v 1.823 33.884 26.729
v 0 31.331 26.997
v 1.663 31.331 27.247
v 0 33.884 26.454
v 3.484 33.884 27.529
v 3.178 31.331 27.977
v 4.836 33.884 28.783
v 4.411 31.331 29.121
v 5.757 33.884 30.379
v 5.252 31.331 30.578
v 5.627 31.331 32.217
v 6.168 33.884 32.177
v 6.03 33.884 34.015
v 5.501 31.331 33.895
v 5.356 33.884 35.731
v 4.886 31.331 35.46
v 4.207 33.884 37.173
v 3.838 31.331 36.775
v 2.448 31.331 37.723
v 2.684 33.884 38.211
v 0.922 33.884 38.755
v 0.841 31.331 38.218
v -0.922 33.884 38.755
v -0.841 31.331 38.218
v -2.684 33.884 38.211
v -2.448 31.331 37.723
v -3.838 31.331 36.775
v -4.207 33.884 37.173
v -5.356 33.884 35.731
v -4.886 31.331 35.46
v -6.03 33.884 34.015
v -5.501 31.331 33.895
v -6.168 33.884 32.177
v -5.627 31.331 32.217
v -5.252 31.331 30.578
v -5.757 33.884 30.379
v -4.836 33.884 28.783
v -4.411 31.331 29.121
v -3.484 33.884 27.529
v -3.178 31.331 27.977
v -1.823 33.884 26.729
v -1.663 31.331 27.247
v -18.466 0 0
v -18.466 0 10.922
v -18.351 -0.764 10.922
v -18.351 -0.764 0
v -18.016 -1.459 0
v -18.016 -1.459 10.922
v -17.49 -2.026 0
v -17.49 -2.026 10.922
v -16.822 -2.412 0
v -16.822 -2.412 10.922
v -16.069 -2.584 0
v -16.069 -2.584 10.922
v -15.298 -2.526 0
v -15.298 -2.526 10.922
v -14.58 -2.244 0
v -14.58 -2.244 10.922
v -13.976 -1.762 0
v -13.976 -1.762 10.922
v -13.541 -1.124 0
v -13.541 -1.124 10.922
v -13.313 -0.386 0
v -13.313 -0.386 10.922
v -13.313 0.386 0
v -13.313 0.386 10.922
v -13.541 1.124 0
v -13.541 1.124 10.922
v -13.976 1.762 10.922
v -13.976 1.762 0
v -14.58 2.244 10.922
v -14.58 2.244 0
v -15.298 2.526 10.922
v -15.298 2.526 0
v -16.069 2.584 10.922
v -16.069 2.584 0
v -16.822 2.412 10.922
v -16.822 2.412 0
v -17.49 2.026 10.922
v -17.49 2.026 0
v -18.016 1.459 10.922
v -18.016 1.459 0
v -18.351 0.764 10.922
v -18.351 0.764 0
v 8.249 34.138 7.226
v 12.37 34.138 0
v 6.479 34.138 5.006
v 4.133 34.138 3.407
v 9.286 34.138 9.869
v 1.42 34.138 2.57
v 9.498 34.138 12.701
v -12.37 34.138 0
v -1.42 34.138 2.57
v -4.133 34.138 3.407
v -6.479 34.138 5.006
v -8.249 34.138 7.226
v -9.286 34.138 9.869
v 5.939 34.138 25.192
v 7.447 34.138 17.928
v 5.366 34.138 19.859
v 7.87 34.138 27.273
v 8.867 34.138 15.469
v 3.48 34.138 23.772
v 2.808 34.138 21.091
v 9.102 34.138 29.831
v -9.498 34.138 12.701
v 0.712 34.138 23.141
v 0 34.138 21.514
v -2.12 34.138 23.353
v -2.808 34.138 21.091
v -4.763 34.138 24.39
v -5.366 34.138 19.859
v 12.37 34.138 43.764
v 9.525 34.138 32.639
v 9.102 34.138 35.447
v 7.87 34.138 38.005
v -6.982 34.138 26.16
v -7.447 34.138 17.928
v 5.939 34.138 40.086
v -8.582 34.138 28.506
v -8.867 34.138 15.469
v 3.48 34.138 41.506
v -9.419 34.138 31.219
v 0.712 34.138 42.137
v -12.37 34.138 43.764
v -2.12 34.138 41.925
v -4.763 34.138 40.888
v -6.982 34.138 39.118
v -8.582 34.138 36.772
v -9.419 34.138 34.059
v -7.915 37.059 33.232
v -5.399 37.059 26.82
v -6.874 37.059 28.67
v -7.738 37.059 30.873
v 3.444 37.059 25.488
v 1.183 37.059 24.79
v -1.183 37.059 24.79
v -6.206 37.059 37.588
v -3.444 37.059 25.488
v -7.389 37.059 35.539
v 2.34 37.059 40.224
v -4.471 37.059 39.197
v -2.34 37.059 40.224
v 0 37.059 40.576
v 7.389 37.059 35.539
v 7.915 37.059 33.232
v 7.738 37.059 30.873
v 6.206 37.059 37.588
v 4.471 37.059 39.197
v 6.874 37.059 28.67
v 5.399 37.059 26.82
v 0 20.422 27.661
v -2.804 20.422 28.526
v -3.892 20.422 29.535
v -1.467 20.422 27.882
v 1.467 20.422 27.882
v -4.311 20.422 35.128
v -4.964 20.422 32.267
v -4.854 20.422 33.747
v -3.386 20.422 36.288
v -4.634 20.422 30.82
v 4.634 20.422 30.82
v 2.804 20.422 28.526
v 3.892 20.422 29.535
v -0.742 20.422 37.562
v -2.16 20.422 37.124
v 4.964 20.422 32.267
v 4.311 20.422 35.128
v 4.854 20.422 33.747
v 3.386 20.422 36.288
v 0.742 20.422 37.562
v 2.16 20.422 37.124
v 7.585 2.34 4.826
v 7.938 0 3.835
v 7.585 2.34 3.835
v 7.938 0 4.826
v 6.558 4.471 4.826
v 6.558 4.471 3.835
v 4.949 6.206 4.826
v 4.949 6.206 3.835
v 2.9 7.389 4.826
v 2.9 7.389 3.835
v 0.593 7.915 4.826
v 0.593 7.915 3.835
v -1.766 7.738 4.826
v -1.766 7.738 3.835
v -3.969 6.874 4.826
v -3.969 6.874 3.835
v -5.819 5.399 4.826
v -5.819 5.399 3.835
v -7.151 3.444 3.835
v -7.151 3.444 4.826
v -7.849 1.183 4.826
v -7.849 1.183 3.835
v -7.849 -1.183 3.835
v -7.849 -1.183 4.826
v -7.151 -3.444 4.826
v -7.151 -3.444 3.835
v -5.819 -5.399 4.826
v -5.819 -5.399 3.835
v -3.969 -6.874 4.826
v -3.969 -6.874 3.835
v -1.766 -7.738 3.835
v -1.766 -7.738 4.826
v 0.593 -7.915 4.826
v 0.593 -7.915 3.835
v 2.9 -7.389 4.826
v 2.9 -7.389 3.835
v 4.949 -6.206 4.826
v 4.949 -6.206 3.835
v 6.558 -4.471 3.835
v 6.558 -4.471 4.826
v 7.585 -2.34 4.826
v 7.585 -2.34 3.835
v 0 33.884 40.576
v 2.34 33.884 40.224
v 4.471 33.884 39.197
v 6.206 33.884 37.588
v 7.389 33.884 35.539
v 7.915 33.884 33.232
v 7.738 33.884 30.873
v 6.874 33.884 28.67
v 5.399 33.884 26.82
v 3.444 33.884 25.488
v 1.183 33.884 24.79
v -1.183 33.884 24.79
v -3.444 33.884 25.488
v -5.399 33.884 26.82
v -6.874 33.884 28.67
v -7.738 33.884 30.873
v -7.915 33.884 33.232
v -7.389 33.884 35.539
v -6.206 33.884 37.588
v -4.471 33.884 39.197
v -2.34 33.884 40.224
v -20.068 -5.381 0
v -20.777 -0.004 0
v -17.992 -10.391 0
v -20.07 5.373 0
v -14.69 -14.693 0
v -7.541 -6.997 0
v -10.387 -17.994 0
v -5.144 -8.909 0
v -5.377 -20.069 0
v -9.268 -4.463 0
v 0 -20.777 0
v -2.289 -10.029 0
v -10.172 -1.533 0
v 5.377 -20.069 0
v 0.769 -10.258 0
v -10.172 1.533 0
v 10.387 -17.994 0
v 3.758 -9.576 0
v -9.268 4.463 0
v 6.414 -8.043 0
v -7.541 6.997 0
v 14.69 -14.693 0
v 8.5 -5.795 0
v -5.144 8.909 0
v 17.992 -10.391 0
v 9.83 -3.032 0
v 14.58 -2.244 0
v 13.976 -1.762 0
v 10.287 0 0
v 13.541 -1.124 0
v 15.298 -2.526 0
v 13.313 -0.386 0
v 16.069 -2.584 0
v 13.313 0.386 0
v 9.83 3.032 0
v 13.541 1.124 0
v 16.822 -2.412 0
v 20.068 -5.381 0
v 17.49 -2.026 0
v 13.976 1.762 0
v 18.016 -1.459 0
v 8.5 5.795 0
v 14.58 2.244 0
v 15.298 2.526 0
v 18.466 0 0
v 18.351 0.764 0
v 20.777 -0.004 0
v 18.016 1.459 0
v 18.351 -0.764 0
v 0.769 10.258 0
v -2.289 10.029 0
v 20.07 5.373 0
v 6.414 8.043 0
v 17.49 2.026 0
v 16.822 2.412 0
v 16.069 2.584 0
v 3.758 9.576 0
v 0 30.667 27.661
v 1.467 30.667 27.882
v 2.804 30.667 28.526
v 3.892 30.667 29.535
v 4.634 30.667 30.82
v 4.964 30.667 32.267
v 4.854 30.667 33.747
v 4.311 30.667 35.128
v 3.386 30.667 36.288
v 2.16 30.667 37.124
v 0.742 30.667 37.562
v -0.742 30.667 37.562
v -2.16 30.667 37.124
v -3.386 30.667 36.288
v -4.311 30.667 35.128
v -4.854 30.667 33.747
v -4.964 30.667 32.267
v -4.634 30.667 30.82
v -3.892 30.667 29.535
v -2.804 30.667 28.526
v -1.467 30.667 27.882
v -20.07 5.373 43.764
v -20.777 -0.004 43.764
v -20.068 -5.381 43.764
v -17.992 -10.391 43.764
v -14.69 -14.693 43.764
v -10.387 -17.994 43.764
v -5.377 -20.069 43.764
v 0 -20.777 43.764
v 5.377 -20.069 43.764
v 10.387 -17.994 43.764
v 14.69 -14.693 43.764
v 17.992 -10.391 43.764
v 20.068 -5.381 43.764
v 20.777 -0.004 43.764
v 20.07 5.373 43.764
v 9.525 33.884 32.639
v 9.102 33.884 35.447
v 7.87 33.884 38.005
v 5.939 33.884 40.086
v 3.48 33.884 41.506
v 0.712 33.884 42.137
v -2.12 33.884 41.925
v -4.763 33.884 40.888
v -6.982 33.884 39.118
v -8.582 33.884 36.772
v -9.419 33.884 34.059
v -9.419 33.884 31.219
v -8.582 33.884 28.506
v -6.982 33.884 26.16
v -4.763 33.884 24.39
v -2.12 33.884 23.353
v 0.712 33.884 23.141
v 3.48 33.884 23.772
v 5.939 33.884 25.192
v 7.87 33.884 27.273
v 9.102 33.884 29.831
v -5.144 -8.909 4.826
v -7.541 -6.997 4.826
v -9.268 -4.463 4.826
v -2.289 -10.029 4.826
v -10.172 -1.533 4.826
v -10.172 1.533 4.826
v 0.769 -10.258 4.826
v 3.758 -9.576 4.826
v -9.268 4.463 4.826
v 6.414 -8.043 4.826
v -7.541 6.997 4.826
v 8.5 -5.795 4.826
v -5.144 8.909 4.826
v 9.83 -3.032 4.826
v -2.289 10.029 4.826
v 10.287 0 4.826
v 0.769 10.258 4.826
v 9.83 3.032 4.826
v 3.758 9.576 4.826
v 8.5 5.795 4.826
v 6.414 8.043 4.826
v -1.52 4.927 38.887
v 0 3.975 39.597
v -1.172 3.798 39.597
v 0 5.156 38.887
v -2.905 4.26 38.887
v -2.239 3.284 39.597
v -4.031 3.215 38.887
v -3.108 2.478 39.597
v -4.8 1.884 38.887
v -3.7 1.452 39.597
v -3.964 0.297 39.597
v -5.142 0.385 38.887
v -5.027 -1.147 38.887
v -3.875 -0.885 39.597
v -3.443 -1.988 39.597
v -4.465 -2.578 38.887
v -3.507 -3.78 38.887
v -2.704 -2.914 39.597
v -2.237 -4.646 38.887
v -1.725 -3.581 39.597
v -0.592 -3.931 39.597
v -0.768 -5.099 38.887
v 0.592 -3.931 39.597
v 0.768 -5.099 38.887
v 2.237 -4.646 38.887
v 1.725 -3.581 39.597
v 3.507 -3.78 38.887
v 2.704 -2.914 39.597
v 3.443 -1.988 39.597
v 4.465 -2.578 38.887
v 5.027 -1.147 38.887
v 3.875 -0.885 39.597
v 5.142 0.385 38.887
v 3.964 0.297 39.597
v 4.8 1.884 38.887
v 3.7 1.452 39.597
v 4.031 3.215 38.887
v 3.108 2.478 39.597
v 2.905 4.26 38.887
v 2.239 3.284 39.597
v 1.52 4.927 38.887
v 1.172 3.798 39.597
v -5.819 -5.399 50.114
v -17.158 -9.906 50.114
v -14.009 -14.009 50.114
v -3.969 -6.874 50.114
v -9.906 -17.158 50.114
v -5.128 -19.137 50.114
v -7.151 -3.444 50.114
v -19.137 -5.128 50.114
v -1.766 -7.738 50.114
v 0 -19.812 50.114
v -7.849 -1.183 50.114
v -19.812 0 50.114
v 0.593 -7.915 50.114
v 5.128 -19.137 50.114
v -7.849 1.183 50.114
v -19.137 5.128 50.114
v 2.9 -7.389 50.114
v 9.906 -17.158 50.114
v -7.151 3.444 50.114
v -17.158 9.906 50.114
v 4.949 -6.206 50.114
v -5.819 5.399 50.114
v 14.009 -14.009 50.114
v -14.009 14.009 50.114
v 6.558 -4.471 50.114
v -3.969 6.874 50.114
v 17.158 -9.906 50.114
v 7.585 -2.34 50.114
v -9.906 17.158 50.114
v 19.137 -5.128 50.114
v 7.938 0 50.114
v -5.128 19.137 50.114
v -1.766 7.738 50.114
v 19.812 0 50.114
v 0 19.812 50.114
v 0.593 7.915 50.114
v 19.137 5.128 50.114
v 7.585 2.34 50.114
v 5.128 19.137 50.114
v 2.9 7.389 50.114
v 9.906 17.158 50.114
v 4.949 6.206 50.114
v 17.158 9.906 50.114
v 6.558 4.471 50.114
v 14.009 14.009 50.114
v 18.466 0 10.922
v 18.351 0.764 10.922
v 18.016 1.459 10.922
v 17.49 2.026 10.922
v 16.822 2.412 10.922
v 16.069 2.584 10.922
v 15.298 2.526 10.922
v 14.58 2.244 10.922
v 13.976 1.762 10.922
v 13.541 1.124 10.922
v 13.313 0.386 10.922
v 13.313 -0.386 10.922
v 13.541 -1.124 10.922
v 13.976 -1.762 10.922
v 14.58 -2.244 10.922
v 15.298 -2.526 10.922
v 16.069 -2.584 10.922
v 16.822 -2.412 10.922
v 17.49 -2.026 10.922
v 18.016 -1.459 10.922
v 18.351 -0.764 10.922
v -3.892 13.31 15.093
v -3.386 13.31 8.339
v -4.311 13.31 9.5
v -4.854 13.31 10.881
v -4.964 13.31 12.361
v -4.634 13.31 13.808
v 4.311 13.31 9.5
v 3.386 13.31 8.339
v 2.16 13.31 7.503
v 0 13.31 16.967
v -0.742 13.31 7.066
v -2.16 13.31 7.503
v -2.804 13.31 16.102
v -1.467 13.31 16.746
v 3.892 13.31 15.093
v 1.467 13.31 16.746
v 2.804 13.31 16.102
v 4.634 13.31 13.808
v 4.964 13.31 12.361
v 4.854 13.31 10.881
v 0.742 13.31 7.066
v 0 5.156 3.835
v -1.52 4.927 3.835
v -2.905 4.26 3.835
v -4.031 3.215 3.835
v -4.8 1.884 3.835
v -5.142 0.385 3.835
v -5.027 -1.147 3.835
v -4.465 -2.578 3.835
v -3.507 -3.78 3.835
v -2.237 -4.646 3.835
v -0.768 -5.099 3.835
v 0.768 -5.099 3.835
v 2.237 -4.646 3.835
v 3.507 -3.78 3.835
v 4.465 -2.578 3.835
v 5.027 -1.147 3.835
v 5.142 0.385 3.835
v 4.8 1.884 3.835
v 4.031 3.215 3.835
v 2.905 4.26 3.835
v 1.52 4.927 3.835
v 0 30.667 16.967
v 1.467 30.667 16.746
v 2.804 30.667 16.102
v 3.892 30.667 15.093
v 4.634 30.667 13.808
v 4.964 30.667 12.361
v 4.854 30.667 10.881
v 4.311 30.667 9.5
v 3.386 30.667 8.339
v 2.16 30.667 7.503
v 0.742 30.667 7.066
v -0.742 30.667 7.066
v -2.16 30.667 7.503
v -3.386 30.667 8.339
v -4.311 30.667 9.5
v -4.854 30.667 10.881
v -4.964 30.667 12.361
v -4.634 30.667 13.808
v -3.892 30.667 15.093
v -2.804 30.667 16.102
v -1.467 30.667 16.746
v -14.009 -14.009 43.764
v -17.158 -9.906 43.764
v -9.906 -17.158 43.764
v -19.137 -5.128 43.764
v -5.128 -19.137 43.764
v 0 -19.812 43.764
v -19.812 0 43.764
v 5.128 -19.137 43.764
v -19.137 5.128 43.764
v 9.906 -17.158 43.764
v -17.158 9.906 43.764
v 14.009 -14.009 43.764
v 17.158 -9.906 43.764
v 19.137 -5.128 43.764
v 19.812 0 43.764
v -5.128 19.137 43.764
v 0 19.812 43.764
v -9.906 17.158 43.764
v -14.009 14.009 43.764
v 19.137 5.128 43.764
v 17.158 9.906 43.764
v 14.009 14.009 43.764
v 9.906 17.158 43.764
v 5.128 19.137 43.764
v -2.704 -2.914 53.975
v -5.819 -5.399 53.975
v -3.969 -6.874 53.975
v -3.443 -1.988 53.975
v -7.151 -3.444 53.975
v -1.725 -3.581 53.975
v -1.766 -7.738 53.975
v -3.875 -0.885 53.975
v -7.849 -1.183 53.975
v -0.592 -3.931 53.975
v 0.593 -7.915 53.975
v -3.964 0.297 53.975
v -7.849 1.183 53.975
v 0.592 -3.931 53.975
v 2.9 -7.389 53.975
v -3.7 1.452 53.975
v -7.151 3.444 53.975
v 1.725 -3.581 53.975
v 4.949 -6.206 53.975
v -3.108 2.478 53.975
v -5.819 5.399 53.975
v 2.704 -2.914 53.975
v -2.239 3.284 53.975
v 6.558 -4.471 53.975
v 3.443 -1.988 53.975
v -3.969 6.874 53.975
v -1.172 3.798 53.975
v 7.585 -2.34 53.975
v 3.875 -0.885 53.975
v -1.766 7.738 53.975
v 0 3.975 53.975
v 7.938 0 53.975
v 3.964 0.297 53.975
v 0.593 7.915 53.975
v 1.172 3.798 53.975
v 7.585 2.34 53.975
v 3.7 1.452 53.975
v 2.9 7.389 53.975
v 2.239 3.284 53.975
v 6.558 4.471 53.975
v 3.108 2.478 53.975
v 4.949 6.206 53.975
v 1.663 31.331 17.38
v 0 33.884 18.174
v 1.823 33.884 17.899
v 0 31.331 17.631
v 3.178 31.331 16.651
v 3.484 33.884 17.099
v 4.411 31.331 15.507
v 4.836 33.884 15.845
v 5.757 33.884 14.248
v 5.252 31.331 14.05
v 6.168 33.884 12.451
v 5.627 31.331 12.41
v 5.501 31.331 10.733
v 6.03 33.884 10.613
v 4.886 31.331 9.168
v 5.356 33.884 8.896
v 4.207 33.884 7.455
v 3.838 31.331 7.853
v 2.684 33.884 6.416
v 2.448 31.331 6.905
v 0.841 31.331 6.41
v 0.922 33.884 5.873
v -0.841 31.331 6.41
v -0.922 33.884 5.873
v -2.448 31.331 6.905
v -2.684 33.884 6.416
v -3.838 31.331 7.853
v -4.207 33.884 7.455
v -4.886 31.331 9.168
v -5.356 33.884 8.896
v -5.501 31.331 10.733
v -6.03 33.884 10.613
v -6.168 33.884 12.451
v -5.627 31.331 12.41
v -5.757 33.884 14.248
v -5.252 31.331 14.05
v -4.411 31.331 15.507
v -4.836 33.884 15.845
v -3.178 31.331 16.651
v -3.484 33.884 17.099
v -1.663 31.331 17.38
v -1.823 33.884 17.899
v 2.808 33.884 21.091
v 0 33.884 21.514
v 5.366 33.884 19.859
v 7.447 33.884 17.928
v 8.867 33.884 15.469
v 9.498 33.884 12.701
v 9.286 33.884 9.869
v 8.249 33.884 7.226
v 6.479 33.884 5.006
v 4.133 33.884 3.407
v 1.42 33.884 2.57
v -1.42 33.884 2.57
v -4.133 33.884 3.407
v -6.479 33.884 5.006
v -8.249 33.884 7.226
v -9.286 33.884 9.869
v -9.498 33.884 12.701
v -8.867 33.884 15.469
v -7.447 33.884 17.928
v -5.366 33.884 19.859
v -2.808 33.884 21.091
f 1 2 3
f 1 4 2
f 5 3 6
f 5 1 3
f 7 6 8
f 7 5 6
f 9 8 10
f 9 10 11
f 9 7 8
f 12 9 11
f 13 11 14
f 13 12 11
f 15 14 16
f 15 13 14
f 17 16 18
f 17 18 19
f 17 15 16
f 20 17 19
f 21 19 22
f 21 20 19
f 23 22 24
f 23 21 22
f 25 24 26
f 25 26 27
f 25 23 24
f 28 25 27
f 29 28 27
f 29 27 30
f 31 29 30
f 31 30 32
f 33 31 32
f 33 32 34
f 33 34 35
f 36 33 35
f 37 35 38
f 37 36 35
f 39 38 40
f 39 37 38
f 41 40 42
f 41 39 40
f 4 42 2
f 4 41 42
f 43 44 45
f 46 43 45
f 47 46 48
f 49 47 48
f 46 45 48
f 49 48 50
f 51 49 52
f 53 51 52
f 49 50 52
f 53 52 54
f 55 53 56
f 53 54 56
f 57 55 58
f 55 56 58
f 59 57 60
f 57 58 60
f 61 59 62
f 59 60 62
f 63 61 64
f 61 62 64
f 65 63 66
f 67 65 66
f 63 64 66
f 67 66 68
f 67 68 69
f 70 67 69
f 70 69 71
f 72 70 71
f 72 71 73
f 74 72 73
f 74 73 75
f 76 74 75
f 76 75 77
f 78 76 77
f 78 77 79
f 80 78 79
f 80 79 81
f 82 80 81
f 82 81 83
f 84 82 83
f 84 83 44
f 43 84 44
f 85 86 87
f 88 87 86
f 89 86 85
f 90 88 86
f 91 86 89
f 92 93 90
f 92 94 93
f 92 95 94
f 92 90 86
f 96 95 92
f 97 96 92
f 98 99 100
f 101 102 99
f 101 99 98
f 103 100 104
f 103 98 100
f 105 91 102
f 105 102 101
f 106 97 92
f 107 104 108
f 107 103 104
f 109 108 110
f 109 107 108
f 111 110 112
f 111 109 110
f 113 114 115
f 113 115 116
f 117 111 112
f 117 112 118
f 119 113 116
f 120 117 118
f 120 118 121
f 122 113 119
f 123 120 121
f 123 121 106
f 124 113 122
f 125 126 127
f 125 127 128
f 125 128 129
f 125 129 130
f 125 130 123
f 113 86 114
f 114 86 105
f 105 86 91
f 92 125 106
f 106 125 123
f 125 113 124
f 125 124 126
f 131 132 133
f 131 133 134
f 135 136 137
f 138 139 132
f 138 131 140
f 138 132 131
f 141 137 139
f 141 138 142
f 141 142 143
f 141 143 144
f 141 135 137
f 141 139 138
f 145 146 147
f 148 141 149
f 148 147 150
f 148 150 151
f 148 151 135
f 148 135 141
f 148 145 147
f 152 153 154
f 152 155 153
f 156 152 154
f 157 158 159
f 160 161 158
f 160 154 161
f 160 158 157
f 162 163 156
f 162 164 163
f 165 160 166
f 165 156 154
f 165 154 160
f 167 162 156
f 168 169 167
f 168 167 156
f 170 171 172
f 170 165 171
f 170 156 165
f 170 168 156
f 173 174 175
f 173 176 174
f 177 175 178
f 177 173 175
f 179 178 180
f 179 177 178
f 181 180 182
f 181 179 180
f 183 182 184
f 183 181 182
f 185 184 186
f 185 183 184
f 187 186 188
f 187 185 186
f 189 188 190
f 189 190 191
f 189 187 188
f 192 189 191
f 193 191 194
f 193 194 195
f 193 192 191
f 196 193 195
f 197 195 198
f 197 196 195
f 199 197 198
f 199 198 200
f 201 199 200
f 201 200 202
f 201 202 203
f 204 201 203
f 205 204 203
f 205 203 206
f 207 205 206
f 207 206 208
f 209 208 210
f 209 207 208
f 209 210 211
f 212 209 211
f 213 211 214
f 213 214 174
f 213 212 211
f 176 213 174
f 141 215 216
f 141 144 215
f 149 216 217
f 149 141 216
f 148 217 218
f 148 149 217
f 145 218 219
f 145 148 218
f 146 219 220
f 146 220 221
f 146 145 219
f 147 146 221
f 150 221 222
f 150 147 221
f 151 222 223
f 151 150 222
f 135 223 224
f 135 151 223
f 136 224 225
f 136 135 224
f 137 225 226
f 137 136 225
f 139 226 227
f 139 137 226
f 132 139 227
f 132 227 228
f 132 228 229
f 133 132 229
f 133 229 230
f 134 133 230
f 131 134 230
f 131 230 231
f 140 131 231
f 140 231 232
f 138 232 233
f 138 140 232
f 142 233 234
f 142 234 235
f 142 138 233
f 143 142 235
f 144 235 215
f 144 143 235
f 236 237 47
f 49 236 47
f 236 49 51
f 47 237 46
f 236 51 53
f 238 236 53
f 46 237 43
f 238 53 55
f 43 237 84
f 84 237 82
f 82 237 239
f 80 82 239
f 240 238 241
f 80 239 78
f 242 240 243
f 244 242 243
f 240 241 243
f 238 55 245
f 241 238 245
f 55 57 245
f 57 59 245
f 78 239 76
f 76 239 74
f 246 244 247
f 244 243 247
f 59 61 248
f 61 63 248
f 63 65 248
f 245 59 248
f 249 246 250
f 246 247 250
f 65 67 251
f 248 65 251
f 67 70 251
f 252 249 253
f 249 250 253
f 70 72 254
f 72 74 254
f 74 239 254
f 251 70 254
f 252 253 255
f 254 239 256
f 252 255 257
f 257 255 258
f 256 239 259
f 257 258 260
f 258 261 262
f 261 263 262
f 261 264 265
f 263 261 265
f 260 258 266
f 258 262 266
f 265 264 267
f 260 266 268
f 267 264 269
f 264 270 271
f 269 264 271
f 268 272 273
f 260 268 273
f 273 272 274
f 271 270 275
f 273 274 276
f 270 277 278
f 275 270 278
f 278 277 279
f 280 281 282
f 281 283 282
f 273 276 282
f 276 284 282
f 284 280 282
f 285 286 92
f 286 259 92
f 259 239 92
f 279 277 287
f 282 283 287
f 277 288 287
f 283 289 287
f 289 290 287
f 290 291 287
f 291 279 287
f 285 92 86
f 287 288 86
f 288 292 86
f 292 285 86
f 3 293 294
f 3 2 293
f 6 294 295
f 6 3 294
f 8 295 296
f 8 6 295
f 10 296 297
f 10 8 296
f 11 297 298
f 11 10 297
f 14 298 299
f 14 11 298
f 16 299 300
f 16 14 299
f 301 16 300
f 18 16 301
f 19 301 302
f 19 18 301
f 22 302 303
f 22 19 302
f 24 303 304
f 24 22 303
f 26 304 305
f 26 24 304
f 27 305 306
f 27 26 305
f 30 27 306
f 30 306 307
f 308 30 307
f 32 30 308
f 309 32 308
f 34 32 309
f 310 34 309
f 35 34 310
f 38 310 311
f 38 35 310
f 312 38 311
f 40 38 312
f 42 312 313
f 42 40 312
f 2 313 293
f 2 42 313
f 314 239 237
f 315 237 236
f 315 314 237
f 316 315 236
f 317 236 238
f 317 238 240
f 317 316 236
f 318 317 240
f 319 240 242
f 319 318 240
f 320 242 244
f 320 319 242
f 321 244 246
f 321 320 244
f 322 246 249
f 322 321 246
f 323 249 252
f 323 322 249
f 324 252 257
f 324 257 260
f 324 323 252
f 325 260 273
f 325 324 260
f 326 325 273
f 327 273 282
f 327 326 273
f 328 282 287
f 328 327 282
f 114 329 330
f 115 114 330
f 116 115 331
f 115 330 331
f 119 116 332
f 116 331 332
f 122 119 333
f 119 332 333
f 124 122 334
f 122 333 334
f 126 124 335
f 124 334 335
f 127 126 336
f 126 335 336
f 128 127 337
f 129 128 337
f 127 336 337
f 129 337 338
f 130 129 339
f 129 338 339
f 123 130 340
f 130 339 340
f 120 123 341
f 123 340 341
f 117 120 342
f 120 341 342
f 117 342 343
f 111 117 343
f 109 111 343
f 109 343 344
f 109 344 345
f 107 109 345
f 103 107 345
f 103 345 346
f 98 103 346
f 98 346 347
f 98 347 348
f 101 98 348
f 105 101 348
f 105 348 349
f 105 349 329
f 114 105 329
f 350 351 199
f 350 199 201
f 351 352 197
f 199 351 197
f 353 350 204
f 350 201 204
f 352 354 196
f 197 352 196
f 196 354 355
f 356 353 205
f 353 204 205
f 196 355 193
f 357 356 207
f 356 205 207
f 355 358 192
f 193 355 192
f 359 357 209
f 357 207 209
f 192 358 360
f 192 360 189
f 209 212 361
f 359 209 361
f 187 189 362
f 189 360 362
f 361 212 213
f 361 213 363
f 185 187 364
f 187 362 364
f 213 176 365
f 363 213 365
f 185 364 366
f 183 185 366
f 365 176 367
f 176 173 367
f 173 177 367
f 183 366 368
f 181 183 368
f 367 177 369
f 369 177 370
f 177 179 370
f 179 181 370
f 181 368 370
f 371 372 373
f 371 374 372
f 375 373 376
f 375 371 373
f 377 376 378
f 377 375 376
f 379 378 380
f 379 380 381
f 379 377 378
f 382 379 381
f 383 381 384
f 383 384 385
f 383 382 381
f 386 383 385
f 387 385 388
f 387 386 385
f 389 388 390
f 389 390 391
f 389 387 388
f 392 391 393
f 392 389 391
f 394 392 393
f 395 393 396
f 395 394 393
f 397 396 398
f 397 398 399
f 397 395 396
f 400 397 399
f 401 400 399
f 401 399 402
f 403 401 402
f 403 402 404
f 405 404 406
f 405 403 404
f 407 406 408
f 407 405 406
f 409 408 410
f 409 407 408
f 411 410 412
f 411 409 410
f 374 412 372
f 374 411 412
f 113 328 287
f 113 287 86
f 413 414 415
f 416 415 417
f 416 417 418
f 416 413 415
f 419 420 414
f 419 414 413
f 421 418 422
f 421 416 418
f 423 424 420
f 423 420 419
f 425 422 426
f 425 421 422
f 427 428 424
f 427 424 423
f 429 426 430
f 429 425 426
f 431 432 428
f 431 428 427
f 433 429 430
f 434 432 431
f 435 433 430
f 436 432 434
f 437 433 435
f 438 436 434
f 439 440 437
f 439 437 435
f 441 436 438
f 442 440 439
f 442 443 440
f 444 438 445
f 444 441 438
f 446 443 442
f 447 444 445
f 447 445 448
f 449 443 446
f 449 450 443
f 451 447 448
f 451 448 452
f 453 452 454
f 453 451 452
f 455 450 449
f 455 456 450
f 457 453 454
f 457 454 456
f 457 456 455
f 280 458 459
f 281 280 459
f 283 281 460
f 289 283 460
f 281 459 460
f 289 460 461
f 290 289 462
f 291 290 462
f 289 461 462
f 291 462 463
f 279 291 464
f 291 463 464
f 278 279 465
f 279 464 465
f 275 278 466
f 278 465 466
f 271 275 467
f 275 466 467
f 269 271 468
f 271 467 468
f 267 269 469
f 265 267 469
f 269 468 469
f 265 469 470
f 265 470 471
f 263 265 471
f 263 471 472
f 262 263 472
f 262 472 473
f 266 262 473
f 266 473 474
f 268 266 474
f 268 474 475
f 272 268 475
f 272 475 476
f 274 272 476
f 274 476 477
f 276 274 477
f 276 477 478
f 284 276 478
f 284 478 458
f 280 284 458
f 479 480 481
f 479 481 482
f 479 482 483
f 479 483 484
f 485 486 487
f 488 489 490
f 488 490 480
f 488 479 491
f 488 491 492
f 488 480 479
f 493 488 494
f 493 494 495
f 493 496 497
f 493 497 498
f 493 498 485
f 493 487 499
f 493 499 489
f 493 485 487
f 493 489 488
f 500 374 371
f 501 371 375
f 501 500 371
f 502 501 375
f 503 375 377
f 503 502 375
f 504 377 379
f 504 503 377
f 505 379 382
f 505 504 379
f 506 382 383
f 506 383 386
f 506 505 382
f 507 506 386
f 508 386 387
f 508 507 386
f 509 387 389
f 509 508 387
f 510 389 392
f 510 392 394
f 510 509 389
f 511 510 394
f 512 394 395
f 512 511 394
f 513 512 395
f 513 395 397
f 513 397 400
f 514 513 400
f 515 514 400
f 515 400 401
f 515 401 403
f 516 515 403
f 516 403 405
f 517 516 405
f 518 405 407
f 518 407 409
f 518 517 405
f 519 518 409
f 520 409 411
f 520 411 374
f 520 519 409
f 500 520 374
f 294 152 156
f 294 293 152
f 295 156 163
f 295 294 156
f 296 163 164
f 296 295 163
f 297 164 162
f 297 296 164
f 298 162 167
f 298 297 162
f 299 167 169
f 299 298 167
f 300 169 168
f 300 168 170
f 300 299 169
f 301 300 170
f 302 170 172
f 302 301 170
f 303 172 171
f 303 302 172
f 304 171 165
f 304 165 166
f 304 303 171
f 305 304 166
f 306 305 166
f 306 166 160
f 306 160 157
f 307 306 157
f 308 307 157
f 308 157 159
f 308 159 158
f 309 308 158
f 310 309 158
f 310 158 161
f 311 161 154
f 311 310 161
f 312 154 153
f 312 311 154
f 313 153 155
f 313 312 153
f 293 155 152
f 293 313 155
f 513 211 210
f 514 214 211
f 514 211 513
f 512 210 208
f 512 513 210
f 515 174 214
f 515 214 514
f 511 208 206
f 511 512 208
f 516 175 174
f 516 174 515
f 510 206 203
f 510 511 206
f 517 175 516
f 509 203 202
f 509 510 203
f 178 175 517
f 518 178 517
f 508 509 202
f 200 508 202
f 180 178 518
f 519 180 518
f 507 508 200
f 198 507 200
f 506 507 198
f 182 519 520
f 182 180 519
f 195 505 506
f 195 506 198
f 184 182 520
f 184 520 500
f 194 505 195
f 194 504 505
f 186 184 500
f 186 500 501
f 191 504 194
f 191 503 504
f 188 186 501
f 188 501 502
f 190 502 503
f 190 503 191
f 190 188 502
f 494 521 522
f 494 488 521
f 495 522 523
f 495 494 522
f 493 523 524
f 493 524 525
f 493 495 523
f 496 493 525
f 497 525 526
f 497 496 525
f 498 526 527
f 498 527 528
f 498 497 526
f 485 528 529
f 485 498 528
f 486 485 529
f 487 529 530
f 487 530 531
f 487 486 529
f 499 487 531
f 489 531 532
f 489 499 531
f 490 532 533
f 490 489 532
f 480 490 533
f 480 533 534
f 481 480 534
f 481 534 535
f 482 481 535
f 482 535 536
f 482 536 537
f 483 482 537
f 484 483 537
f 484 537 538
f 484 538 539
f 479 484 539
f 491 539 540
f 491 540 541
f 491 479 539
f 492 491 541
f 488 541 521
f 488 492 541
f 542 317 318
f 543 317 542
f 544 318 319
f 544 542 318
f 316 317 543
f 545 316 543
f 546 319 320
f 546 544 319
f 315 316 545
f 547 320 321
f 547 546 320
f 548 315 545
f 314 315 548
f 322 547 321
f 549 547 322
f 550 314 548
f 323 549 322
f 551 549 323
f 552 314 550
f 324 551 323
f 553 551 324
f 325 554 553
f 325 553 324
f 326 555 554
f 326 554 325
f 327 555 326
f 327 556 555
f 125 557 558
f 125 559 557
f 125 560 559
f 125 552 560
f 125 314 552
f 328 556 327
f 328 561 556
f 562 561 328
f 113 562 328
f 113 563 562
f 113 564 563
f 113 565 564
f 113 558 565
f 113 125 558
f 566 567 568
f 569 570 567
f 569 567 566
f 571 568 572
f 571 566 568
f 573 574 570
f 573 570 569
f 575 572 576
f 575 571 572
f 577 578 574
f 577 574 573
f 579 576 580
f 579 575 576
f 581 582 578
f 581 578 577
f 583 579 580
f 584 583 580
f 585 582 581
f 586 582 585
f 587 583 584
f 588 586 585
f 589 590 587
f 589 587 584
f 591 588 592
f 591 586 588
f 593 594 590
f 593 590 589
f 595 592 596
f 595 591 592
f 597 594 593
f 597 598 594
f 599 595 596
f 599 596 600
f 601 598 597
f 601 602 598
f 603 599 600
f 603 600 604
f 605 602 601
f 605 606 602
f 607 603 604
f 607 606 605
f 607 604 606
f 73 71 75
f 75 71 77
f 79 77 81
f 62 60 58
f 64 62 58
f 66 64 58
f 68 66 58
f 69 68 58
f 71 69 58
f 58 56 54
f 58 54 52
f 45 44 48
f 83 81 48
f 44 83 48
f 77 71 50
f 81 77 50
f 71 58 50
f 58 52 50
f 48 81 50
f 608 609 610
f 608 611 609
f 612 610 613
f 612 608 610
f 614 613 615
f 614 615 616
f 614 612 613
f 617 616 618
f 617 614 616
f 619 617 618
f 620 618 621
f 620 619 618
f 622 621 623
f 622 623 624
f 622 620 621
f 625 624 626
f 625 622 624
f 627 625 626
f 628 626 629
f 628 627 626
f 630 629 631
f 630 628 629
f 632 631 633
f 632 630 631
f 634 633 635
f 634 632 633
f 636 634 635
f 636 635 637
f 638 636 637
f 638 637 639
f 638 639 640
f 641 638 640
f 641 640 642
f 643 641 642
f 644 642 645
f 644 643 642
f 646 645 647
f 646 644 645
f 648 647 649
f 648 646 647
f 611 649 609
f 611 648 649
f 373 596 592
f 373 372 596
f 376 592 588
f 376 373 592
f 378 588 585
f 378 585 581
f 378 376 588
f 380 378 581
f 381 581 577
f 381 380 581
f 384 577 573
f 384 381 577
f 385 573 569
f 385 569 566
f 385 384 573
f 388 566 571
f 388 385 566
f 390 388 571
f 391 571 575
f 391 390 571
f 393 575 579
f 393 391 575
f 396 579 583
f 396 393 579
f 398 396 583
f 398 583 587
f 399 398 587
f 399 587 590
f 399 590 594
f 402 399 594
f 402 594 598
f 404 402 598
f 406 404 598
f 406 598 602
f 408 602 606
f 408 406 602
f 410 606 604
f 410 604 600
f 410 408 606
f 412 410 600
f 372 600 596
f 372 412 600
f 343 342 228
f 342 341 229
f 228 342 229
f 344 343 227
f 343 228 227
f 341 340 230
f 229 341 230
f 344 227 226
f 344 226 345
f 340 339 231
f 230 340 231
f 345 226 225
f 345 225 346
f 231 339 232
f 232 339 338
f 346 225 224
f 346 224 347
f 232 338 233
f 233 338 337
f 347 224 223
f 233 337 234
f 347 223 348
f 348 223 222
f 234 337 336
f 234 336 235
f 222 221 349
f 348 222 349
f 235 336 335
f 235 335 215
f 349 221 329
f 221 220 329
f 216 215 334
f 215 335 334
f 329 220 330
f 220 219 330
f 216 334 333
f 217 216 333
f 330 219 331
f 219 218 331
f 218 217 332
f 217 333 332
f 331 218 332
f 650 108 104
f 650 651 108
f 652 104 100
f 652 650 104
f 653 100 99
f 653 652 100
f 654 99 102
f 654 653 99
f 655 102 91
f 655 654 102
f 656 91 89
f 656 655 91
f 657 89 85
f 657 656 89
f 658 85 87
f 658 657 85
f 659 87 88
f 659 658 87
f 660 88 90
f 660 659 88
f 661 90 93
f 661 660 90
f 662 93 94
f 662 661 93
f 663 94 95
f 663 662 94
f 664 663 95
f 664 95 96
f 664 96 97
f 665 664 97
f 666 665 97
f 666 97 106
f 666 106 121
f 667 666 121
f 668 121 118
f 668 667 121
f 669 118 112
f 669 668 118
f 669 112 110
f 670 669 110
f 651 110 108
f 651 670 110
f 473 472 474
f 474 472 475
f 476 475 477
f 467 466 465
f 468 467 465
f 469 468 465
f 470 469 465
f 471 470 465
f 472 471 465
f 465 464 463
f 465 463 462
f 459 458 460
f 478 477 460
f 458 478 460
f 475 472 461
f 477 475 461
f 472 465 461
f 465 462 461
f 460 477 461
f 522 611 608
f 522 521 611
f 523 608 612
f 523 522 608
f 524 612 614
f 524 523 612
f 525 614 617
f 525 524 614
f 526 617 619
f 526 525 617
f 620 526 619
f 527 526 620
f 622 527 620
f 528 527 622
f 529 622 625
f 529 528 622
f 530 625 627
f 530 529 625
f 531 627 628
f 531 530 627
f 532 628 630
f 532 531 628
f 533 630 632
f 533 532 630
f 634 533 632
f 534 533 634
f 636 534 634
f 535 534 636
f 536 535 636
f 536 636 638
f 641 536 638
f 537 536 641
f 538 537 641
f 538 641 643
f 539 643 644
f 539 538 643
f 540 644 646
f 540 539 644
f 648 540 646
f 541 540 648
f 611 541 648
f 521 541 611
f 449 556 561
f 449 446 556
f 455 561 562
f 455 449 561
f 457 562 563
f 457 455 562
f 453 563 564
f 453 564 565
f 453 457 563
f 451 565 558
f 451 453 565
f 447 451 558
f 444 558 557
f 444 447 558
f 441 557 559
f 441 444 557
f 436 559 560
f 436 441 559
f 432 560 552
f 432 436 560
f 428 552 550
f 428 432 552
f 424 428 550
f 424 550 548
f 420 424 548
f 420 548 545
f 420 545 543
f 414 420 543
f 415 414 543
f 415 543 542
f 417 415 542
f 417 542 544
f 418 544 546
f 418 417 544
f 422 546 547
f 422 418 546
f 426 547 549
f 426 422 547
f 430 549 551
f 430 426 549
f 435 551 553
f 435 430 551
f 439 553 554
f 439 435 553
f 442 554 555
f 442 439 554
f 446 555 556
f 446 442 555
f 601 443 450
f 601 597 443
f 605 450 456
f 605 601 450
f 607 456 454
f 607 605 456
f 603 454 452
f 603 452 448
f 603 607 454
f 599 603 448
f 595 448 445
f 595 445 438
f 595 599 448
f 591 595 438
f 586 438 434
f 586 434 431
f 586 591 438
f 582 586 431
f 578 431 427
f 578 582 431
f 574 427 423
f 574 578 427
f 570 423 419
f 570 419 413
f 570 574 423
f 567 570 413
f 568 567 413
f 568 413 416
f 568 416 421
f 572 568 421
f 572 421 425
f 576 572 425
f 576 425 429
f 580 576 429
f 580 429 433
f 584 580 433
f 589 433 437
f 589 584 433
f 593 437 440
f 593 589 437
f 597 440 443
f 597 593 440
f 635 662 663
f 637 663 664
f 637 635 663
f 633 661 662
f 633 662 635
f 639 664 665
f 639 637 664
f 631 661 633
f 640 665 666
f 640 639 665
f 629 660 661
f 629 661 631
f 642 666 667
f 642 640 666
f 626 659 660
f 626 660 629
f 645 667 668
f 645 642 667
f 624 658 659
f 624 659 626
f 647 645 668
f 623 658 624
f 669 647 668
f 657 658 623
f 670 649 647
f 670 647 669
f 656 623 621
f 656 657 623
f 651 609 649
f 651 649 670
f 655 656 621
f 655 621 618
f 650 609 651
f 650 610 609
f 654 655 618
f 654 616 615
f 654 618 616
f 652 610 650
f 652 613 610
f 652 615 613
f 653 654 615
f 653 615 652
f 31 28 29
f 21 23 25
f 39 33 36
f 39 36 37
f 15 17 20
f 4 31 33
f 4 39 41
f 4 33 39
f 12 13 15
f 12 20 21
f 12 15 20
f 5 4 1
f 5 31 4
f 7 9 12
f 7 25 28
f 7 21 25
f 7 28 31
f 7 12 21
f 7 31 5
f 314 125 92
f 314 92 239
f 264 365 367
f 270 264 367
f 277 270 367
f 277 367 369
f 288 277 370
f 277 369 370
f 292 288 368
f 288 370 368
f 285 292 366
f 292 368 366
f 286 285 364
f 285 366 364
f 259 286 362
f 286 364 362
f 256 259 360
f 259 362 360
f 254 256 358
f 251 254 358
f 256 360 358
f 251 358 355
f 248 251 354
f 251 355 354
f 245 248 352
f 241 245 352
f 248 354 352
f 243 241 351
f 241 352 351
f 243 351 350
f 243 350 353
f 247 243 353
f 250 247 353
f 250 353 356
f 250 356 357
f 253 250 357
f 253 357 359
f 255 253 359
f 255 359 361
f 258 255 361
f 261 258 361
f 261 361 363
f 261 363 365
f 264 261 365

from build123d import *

# Parameters (mm, degrees)
EXTRUDE1_DEPTH    = 43.7642
HOLE1_D           = 19.05
HOLE1_DEPTH       = 0.254
HOLE2_D           = 20.574
HOLE2_DEPTH       = 4.826
SKETCH6_W         = 7.9375
SKETCH6_H         = 0.9906
SKETCH8_W         = 7.9375
SKETCH8_H         = 3.175
HOLE3_D           = 5.1816
HOLE3_DEPTH       = 10.922
CIRPATTERN1_COUNT = 2


with BuildPart() as part:
    # Sketch1 → Extrude1 (new body)
    with BuildSketch(Plane.XY.offset(43.7642)):
        with BuildLine():
            Line((20.070420221, 5.373106363), (12.3698, 34.1376))
            Line((12.3698, 34.1376), (-12.3698, 34.1376))
            Line((-12.3698, 34.1376), (-20.070420221, 5.373106363))
            ThreePointArc((-20.070420221, 5.373106363), (0, -20.7772), (20.070420221, 5.373106363))
        make_face()
    extrude(amount=-EXTRUDE1_DEPTH)

    # Hole1
    with Locations(Plane(origin=(0, 34.1376, 0), x_dir=(-1, 0, 0), z_dir=(0, 1, 0))):
        with Locations((0, 32.639)):
            Hole(HOLE1_D / 2, depth=HOLE1_DEPTH)

    # Hole2
    with Locations(Plane(origin=(0, 0, 0), x_dir=(-1, 0, 0), z_dir=(0, 0, -1))):
        with Locations((0, 0)):
            Hole(HOLE2_D / 2, depth=HOLE2_DEPTH)

    # Sketch7 → Revolve2 (revolve)
    with BuildSketch(Plane.XZ):
        Polygon((7.9375, 53.975), (0, 53.975), (0, 43.7642), (19.812, 43.7642), (19.812, 50.1142), (7.9375, 50.1142), align=None)
    revolve(axis=Axis((0, 0, 0), (0, 0, 1)))

    # Sketch6 → Revolve1 (revolve)
    with BuildSketch(Plane.XZ):
        with Locations((3.96875, 4.3307)):
            Rectangle(SKETCH6_W, SKETCH6_H)
    revolve(axis=Axis((0, 0, 0), (0, 0, 1)))

    # Sketch8 → Revolve3 (revolve)
    with BuildSketch(Plane(origin=(0, 0, 32.639), x_dir=(-1, 0, 0), z_dir=(0, 0, -1)), mode=Mode.PRIVATE) as revolve3_sk:
        with Locations((-3.96875, 35.4711)):
            Rectangle(SKETCH8_W, SKETCH8_H)
    revolve(revolve3_sk.sketch.rotate(Axis((0, 0, 32.639), (0, 1, 0)), 270), axis=Axis((0, 0, 32.639), (0, 1, 0)))  # turned: the seam where the file's is

    # Sketch9 → Cut-Revolve1 (revolve, cut)
    with BuildSketch(Plane(origin=(0, 0, 11.9888), x_dir=(-1, 0, 0), z_dir=(0, 0, -1)), mode=Mode.PRIVATE) as cut_revolve1_sk:
        Polygon((-4.9784, 13.3096), (0, 13.3096), (0, 34.1376), (-9.525, 34.1376), (-9.525, 33.8836), (-6.1849, 33.8836), (-5.642306865, 31.3309), (-4.9784, 30.666993135), align=None)
    revolve(cut_revolve1_sk.sketch.rotate(Axis((0, 13.3096, 11.9888), (0, 1, 0)), 270), axis=Axis((0, 13.3096, 11.9888), (0, 1, 0)), mode=Mode.SUBTRACT)  # turned: the seam where the file's is

    # Sketch10 → Cut-Revolve2 (revolve, cut)
    with BuildSketch(Plane.XY.offset(32.639), mode=Mode.PRIVATE) as cut_revolve2_sk:
        Polygon((6.1849, 33.8836), (0, 33.8836), (0, 20.4216), (4.9784, 20.4216), (4.9784, 30.666993135), (5.642306865, 31.3309), align=None)
    revolve(cut_revolve2_sk.sketch.rotate(Axis((0, 33.8836, 32.639), (0, -1, 0)), 270), axis=Axis((0, 33.8836, 32.639), (0, -1, 0)), mode=Mode.SUBTRACT)  # turned: the seam where the file's is

    # Hole3
    with Locations(Plane(origin=(0, 0, 0), x_dir=(-1, 0, 0), z_dir=(0, 0, -1))):
        with Locations((-15.875, 0)):
            hole3 = Hole(HOLE3_D / 2, depth=HOLE3_DEPTH)

    # CirPattern1: Hole3 ×2 about axis
    cirpattern1_axis = Axis((0, 0, 0), (0, 0, 1))
    for i in range(1, CIRPATTERN1_COUNT):
        add(hole3.rotate(cirpattern1_axis, i * 360 / CIRPATTERN1_COUNT), mode=Mode.SUBTRACT)

    # Sketch15 → Hole5 (revolve, cut)
    with BuildSketch(Plane(origin=(0, 0, 3.8354), x_dir=(0, 1, 0), z_dir=(1, 0, 0))):
        Polygon((0, 0), (0, 50.1396), (3.9751, 50.1396), (3.9751, 35.761676477), (5.1562, 35.052), (5.1562, 0), align=None)
    revolve(axis=Axis((0, 0, -2.294623899), (0, 0, 1)), mode=Mode.SUBTRACT)


solid = part.part
